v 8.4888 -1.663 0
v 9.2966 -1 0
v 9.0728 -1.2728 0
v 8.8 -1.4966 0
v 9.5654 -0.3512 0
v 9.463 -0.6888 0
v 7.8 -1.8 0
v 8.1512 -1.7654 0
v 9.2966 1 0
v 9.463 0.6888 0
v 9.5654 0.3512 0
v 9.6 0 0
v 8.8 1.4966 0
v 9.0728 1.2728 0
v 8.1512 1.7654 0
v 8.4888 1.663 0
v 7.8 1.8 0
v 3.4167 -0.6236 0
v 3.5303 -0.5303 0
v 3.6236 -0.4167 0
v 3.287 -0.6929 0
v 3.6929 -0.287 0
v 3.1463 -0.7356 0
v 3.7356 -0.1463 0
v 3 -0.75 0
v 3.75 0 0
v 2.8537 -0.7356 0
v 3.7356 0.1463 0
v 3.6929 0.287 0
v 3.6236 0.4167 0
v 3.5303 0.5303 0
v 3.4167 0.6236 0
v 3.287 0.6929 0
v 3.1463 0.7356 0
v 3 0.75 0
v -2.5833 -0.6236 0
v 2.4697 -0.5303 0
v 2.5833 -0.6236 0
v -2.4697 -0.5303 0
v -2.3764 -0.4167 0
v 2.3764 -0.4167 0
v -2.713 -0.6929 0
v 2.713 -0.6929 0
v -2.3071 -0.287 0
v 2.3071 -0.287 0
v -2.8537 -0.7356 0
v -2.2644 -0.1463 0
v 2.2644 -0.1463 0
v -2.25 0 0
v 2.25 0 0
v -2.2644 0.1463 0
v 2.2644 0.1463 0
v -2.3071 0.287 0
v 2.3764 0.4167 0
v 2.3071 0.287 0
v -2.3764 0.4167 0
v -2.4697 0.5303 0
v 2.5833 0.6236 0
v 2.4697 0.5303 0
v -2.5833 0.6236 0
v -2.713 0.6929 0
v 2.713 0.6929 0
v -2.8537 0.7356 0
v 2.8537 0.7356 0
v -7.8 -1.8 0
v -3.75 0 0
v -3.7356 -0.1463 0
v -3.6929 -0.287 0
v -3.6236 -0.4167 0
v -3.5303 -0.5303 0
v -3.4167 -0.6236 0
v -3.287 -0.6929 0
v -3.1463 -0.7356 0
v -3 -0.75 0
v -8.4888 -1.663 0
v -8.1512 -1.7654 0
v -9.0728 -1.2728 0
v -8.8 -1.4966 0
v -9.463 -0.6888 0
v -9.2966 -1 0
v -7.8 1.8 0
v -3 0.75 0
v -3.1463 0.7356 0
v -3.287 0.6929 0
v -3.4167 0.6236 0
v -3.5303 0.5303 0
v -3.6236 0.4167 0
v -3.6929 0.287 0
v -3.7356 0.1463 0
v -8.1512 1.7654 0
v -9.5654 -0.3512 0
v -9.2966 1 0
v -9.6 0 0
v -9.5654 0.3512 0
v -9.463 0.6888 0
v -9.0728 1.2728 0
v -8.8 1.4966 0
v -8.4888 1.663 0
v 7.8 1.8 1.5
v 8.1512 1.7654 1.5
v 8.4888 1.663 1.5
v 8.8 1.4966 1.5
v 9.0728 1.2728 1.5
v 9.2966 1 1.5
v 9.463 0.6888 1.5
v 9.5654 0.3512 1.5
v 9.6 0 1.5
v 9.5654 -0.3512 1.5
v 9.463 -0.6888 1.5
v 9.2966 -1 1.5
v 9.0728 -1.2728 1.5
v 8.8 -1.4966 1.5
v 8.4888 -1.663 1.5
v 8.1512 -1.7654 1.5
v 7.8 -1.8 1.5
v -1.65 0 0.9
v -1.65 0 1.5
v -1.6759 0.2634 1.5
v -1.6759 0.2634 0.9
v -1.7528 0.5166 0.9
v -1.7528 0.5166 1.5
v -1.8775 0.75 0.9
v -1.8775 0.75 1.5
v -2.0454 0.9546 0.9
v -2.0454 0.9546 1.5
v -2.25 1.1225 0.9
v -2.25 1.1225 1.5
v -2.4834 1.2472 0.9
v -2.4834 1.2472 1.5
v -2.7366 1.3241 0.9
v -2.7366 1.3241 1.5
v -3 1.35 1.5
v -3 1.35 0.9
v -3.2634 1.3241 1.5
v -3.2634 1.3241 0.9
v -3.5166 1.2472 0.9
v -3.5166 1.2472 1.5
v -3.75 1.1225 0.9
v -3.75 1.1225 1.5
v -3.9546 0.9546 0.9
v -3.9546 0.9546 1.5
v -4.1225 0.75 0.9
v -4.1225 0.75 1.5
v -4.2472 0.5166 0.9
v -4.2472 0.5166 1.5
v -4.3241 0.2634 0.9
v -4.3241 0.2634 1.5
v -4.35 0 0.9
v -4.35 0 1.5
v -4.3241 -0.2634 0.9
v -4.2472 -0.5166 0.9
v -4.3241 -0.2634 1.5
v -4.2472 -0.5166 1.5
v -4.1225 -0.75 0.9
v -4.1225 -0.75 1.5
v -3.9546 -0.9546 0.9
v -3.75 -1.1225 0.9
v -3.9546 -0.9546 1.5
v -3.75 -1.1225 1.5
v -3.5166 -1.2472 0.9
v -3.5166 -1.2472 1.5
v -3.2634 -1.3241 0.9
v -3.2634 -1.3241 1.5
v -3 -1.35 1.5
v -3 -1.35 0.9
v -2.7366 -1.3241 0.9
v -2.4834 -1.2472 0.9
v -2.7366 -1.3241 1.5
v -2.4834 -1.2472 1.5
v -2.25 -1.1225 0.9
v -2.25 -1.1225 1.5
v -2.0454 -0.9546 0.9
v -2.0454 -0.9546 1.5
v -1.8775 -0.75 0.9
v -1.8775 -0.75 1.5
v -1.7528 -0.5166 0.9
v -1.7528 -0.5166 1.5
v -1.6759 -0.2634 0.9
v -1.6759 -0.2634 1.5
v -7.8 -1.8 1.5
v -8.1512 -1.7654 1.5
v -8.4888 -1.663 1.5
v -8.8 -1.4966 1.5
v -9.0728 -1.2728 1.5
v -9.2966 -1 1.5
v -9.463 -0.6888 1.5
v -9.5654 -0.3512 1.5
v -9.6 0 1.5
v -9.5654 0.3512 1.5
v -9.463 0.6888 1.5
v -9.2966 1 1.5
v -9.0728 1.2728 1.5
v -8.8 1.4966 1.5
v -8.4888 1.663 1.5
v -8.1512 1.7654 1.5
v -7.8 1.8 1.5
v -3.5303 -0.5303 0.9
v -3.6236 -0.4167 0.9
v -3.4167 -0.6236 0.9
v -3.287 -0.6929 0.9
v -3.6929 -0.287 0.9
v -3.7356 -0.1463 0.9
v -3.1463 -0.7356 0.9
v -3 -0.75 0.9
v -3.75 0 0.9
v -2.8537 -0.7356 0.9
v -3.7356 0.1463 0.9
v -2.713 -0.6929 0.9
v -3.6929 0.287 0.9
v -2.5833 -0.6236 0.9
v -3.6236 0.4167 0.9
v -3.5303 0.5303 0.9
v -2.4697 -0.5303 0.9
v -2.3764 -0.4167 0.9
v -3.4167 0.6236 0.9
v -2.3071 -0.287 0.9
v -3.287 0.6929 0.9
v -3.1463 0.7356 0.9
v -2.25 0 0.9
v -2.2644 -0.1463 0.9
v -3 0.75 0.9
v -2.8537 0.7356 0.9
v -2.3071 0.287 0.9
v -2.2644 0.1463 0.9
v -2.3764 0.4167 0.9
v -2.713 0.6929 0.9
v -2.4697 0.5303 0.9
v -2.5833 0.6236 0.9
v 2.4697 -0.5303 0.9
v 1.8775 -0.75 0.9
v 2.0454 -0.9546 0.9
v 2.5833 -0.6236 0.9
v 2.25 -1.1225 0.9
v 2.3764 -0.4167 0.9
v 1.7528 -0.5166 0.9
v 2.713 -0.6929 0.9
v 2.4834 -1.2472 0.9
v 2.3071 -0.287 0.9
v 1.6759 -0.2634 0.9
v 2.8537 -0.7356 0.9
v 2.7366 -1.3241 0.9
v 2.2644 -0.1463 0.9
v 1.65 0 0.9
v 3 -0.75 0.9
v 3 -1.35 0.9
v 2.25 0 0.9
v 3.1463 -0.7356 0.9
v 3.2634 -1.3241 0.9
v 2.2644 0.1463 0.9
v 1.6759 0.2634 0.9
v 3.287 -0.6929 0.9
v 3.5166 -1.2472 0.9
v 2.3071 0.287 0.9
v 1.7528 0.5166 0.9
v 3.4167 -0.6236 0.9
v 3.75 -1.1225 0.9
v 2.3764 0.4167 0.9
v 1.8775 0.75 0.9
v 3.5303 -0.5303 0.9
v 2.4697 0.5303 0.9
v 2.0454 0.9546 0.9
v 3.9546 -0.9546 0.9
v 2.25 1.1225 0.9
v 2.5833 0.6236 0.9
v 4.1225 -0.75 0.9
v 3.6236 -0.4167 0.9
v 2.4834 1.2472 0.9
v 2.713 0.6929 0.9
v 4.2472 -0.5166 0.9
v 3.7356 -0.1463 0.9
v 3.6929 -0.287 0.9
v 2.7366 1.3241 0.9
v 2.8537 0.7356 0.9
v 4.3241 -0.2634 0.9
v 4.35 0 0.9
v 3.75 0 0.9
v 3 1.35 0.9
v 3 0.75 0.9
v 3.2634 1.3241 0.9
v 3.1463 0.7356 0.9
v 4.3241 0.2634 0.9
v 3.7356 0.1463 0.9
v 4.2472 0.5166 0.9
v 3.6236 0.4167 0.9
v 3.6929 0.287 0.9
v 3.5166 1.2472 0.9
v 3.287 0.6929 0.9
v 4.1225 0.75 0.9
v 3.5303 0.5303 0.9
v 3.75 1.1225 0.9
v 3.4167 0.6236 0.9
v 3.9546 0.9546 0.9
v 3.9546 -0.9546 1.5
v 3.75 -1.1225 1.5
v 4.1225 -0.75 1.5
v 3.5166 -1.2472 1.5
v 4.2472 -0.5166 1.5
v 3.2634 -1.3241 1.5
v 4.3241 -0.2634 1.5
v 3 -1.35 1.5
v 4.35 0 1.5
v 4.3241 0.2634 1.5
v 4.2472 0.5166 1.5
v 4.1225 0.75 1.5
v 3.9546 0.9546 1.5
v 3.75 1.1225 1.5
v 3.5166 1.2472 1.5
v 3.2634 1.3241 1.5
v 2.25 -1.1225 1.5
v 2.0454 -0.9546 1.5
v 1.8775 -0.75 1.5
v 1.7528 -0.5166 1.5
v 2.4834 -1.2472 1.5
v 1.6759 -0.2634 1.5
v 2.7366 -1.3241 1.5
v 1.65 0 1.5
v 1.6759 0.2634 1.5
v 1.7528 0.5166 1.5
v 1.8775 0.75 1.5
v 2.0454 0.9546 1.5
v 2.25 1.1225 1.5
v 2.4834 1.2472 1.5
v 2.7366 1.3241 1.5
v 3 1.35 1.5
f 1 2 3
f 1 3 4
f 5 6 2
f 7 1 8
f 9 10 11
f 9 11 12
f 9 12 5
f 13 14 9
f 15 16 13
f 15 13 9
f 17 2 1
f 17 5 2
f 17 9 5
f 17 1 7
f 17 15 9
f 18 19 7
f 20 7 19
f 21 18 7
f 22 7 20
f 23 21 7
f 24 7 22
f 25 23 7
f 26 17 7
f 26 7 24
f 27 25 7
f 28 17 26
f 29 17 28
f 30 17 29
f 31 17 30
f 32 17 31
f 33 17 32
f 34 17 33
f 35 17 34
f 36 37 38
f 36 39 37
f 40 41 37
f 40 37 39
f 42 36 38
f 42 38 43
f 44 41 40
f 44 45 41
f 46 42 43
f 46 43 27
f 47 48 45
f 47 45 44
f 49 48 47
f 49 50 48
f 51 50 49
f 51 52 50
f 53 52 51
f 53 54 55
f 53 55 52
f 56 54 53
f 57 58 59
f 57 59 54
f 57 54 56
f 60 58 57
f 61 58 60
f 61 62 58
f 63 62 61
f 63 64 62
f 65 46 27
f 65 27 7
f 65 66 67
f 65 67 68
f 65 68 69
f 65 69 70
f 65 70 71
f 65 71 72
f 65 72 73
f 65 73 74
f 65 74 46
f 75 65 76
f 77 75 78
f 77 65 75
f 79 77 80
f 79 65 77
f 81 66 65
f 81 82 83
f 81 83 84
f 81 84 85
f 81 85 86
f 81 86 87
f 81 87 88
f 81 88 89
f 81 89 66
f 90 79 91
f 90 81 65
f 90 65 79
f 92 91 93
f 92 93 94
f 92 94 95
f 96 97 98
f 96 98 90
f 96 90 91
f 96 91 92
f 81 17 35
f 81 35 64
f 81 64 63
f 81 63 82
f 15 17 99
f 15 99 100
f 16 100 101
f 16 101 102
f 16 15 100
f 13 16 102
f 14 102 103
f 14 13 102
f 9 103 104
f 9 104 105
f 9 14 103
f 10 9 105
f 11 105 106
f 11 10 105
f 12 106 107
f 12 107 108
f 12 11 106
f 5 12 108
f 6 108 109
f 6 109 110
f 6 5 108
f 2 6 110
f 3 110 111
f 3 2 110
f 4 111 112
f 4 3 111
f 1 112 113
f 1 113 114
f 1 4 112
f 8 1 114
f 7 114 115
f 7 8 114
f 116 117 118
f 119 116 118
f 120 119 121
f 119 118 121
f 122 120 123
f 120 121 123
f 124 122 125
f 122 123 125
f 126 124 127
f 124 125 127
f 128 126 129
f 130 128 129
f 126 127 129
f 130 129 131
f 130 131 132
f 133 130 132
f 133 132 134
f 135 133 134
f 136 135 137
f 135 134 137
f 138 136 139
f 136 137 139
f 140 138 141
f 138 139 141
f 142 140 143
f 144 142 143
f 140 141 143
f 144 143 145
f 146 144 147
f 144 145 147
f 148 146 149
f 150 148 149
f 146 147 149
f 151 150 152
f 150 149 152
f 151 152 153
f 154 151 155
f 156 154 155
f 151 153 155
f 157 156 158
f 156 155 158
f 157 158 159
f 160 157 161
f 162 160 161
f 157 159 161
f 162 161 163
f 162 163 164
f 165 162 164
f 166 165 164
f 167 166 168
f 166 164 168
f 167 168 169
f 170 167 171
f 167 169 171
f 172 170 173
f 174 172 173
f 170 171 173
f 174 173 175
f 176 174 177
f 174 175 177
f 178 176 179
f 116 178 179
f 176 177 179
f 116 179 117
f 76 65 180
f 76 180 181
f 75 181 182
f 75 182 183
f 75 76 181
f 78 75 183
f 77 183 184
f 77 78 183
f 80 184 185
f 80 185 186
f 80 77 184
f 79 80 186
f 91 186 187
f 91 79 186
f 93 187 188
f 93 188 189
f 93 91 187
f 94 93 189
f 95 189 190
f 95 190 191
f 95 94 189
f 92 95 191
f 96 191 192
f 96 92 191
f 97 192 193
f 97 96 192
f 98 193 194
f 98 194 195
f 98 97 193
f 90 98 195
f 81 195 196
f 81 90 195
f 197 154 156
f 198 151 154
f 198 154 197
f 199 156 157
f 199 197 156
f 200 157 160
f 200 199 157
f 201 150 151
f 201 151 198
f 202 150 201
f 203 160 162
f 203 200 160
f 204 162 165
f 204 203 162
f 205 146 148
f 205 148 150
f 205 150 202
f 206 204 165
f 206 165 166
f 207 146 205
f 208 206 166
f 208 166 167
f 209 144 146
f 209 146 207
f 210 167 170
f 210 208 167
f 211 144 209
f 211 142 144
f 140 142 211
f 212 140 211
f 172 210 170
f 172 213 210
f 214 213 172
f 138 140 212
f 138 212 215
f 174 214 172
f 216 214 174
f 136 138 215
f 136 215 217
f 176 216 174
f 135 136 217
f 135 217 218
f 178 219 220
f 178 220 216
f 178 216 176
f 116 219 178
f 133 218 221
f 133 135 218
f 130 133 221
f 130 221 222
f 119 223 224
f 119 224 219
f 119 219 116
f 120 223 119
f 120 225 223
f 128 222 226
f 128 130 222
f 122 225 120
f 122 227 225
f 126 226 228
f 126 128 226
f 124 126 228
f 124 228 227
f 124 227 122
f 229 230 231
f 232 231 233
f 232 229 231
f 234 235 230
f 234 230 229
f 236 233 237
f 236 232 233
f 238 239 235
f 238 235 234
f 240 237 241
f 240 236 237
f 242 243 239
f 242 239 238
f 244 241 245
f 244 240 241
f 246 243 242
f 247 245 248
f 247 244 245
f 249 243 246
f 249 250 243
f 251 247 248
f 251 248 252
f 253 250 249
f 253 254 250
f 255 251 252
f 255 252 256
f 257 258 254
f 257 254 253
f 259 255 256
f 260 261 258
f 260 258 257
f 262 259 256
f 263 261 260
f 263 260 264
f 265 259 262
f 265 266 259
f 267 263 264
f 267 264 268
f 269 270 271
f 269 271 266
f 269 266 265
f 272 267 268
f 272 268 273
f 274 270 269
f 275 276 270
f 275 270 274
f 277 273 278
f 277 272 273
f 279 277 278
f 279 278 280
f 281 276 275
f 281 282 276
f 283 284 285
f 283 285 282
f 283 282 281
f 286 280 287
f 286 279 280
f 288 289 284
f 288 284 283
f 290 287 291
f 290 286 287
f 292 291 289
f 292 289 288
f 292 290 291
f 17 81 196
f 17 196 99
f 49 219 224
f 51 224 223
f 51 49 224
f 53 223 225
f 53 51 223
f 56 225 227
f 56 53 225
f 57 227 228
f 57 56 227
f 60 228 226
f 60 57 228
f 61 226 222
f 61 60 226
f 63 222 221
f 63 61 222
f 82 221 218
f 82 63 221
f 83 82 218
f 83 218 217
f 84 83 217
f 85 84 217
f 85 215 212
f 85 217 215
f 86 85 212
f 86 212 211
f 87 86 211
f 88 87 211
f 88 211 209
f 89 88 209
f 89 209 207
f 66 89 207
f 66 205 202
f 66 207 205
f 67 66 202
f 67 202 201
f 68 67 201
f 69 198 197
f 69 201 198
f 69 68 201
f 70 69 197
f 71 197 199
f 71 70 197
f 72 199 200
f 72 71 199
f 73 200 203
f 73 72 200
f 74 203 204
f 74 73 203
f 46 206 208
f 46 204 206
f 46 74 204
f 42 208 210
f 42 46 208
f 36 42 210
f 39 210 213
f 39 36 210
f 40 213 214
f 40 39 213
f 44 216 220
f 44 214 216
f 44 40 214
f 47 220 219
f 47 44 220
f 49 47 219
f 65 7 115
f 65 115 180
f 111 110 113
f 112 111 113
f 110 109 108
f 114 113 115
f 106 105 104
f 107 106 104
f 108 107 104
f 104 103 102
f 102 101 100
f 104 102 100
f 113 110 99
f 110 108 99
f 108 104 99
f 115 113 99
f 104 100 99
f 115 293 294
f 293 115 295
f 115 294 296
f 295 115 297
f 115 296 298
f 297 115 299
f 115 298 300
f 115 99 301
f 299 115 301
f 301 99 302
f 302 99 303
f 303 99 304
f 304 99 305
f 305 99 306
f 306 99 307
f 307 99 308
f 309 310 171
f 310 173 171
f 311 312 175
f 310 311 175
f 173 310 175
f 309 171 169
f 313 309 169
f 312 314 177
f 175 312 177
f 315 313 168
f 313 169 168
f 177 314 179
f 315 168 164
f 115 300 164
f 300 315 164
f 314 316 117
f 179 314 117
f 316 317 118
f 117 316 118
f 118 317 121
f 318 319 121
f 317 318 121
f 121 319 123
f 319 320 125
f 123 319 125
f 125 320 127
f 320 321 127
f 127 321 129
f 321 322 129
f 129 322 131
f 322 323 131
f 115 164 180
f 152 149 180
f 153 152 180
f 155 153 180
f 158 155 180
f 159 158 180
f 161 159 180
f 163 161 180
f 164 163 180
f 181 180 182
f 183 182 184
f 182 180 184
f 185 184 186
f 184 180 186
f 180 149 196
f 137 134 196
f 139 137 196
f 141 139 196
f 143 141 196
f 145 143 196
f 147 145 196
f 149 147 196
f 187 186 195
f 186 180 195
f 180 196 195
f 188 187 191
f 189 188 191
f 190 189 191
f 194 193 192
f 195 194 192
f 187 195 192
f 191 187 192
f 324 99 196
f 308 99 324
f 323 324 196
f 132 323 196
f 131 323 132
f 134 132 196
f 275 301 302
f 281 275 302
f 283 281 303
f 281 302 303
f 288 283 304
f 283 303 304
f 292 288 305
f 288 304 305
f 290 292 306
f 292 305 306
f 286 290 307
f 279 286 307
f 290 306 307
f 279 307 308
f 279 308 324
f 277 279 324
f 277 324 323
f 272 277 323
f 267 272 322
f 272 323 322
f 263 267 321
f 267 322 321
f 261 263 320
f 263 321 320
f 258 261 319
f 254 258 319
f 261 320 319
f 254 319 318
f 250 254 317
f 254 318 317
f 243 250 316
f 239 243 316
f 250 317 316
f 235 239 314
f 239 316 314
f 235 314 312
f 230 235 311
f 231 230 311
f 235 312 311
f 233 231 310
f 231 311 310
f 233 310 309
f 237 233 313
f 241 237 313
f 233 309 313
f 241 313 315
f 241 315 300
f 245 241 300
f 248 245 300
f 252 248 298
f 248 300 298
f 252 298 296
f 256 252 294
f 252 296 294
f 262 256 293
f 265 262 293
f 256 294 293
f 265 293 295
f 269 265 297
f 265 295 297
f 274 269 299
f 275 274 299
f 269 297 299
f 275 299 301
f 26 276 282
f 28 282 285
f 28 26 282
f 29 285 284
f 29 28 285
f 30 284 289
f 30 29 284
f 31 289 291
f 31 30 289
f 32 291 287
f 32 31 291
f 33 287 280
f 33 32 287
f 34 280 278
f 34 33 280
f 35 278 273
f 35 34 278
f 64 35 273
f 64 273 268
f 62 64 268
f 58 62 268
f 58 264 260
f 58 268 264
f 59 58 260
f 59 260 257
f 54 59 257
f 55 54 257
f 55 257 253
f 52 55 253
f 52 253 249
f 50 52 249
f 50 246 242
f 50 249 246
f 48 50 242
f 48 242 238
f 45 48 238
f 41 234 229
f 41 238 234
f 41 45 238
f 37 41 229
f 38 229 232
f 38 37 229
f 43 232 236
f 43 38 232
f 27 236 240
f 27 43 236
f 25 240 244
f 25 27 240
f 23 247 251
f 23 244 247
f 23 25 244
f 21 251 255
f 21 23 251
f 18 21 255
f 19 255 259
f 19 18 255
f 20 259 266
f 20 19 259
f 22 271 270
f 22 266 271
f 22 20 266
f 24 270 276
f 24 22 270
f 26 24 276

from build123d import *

# Parameters (mm, degrees)
SKETCH_1_R          = 1.25
EXTRUDE_1_DEPTH     = 2.5
SKETCH_2_R          = 2.25
CUT_EXTRUDE_1_DEPTH = 1
SCALE_1_SCALE       = 0.6


with BuildPart() as part:
    # 草图1 → 凸台-拉伸1 (new body)
    with BuildSketch(Plane.XY):
        with BuildLine():
            Line((-13, 3), (13, 3))
            ThreePointArc((13, 3), (16, 0), (13, -3))
            Line((13, -3), (-13, -3))
            ThreePointArc((-13, -3), (-16, 0), (-13, 3))
        make_face()
        with Locations((5, 0)):
            Circle(SKETCH_1_R, mode=Mode.SUBTRACT)
        with Locations((-5, 0)):
            Circle(SKETCH_1_R, mode=Mode.SUBTRACT)
    extrude(amount=EXTRUDE_1_DEPTH)

    # 草图2 → 切除-拉伸1 (cut)
    with BuildSketch(Plane.XY.offset(2.5)):
        with Locations((-5, 0)):
            Circle(SKETCH_2_R)
        with Locations((5, 0)):
            Circle(SKETCH_2_R)
    extrude(amount=-CUT_EXTRUDE_1_DEPTH, mode=Mode.SUBTRACT)


with BuildPart() as part_1:
    # 缩放比例1: scaled about (0, 0, 0)
    add(part.part.scale(SCALE_1_SCALE))


solid = part_1.part
